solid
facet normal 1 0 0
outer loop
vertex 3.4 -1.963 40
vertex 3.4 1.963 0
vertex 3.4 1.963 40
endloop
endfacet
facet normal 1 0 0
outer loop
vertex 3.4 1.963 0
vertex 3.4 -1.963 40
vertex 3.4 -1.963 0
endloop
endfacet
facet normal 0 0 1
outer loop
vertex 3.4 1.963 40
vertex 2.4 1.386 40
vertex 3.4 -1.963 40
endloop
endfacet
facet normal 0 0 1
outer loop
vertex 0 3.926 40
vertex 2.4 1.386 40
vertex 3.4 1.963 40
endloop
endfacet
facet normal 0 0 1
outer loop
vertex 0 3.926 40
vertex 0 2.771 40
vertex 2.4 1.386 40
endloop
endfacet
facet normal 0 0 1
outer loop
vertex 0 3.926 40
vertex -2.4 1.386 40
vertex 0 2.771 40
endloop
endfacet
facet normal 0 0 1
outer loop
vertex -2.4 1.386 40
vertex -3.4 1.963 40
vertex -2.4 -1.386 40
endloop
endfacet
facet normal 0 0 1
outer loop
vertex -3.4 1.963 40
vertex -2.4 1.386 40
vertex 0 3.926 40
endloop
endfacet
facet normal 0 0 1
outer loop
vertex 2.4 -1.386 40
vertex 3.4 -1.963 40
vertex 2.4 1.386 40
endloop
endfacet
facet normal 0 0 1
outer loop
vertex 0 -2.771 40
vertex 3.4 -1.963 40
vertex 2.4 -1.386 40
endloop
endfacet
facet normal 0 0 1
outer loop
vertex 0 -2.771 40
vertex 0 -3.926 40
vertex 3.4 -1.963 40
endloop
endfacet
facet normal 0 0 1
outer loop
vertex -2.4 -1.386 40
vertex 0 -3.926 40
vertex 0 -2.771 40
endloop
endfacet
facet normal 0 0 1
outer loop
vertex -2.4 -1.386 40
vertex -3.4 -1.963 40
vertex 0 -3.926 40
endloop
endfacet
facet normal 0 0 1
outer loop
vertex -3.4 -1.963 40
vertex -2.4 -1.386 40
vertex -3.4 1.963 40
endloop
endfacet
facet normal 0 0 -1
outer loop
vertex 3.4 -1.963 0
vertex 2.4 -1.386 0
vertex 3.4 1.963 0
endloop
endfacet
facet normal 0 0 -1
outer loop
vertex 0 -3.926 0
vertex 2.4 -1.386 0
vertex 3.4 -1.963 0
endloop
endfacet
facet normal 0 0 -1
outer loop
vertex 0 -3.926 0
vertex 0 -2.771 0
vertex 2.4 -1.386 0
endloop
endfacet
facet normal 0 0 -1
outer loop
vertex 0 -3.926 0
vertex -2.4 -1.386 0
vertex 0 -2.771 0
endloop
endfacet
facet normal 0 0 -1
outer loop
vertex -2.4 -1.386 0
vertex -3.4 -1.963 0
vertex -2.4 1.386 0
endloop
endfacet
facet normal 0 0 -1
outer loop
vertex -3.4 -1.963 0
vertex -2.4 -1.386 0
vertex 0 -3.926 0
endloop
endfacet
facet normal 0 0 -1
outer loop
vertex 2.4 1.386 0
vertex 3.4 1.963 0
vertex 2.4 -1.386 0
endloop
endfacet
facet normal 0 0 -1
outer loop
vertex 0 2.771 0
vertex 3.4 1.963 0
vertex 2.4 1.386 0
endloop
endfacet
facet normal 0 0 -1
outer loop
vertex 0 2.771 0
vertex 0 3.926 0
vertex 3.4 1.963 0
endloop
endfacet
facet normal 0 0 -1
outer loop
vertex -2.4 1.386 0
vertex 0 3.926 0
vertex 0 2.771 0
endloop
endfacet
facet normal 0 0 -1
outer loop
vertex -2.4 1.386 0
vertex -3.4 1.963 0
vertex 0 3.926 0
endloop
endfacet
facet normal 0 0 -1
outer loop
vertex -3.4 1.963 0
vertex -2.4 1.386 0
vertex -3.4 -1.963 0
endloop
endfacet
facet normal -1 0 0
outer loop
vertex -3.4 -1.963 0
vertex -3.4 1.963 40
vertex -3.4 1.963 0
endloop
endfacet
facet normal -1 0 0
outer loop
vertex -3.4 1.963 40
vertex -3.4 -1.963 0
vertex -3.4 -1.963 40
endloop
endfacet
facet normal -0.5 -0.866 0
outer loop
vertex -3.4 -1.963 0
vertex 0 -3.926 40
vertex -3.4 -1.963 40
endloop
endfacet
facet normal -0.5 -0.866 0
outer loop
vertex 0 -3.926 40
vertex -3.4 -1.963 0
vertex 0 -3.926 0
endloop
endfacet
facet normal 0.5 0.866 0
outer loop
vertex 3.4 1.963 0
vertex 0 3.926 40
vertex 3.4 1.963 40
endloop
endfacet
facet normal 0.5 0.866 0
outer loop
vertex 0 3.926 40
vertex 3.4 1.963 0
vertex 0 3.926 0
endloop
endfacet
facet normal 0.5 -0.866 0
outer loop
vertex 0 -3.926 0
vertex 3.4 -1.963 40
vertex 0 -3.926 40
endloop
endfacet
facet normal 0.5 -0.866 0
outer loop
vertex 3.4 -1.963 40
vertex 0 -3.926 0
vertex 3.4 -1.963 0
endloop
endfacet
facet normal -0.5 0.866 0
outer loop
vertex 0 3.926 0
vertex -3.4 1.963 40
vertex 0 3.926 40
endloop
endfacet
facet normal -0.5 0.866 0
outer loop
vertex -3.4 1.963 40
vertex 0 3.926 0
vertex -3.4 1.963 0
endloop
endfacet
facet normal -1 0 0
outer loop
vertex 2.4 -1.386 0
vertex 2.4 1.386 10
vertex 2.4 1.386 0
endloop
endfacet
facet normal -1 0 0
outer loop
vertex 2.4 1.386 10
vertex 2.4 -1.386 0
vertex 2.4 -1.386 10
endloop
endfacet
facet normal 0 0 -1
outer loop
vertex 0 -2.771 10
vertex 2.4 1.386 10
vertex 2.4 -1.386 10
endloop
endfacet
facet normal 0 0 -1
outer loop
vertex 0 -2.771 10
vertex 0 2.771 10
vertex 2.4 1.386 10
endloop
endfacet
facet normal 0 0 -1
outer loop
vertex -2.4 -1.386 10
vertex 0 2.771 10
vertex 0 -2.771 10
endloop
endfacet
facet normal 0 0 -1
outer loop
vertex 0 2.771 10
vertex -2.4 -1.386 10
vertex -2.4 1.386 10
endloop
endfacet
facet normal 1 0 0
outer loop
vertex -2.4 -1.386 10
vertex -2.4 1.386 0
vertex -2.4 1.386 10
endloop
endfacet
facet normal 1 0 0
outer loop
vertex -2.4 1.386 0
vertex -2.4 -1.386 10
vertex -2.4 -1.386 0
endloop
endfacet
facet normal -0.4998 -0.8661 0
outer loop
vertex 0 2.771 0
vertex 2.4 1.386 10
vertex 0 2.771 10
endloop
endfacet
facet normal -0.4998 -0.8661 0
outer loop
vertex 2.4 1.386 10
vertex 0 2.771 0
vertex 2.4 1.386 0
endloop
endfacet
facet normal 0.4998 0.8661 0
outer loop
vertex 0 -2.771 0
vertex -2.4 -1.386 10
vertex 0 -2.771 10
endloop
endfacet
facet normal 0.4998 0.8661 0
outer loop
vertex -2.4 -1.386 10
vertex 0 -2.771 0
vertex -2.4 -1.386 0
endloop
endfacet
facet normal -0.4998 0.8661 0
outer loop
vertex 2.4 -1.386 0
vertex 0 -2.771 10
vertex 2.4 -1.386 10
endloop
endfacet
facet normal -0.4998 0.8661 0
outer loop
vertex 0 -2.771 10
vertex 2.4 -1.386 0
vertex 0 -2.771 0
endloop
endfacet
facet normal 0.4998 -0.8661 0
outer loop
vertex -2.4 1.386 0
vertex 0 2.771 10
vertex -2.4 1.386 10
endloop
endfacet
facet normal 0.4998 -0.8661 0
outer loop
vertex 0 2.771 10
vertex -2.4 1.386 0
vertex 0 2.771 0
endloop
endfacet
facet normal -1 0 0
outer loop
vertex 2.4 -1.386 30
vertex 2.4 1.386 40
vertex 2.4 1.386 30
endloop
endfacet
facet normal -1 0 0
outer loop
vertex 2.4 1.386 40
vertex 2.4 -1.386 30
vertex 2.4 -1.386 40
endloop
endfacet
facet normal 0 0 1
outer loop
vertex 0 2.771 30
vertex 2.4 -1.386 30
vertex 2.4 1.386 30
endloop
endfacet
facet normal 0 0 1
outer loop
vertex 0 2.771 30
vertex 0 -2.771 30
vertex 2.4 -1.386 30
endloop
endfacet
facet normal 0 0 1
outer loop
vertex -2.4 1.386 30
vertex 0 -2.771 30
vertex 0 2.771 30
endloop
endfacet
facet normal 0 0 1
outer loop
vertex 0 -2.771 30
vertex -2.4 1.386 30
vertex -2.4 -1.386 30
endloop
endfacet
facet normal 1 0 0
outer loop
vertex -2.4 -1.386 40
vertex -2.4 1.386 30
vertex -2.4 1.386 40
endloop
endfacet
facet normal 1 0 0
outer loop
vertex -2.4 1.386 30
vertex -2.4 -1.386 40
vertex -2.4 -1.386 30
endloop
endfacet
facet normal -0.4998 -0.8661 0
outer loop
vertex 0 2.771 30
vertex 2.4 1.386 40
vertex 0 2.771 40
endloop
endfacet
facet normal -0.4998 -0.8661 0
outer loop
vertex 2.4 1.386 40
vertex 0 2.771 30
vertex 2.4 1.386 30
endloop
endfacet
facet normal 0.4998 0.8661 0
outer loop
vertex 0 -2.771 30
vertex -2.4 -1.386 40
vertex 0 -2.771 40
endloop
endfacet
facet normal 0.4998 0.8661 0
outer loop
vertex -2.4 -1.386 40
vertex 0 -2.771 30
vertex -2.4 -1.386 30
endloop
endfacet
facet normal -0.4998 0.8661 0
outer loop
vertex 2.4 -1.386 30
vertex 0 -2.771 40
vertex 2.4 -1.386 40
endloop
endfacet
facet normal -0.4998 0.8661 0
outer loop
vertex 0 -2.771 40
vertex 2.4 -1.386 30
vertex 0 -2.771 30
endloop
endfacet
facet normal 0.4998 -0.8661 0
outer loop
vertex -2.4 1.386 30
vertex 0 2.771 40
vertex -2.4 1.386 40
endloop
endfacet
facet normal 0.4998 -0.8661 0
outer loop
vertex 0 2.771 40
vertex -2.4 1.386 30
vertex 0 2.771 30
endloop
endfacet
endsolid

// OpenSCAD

/* [Adapter Type] */
type=2; // [1:pin+hole,2:hole+hole]
/* [Adapter shape] */
//exterior of the adapter
form=2; // [1:cylinder,2:hexagon]
/* [Bit size] */
// size of the bit in mm
size=4;
// Depth of the hole for the bit in mm
depth=10;
/* [Joint parameters] */
//thickness of wall
wall=2; // [1:1mm,2:2mm,3:3mm,4:4mm,5:5mm, 6:6mm]
// distance (in mm.) between two bit's holes inside the adapter. Use it to get long adapter. Full adapter height=depth*2+distance
distance=20;
/* [Adjustments] */
// Delta setting may be used to compensate material shrinkage or printer's calibration issues. Pin will be decreased, holes will be increased for this value. Try  the default, correct if too tight/free.
//setting for bottom part
delta_bottom=0.8;
//setting for top part
delta_top=0.8;

if (distance<2) {
    distance=2;
    };

radius=(wall+size)/2;
    
if (type==2){
difference(){
difference(){
if (form==1){
cylinder(depth*2+distance,r=radius+delta_bottom,center=false);
}else{
    Hexagone(radius*2+delta_bottom,depth*2+distance);
};
Hexagone(size+delta_bottom,depth);
    };
translate([0,0,depth+distance]) {Hexagone(size+delta_top,depth);
    };
};
} else {
difference(){
if (form==1) {
    cylinder(depth+distance,r=radius+delta_bottom,center=false);
} else {
    Hexagone(radius*2+delta_bottom,depth+distance);
};
Hexagone(size+delta_bottom,depth);
};
translate([0,0,depth+distance]) {Hexagone(size-delta_top,depth);
    };
};
function cot(x)=1/tan(x);
module Hexagone(size,height)
{
	angle = 60;		
	width = size * cot(angle);

    translate([0,0,height/2]){

	union()
	{
		rotate([0,0,0])
			cube([size,width,height],center=true);
		rotate([0,0,angle])
			cube([size,width,height],center=true);
		rotate([0,0,2*angle])
			cube([size,width,height],center=true);
	}
};
}
